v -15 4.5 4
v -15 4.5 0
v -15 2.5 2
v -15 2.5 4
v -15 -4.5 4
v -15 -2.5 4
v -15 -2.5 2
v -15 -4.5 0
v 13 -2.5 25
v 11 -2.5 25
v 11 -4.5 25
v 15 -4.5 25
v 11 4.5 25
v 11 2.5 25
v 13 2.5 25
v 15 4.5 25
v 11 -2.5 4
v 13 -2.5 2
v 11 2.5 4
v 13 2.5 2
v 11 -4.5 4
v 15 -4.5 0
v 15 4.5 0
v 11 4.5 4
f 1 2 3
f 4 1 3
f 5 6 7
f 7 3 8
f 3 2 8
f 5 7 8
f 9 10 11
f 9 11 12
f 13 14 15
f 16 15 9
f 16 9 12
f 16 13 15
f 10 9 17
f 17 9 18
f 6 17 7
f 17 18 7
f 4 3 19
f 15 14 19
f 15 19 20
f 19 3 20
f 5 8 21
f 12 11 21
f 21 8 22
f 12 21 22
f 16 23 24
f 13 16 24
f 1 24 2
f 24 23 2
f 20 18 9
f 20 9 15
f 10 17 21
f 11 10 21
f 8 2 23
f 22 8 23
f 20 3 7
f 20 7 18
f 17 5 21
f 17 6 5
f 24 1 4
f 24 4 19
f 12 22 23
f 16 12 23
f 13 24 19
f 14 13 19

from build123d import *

# Parameters (mm, degrees)
F0_W     = 2
F0_H     = 5
F0_W_2   = 26
F0_H_2   = 2
F1_DEPTH = 2
F2_DEPTH = 4
F3_DEPTH = 25


with BuildPart() as f1:
    # F0 (on Top) → F1 (new body)
    with BuildSketch(Plane.XY):
        Polygon((11, -4.5), (15, -4.5), (15, -2.5), (13, -2.5), (11, -2.5), align=None)
        Polygon((-15, -4.5), (11, -4.5), (11, -2.5), (-13.6096680164, -2.5), (-15, -2.5), align=None)
        with Locations((14, 0)):
            Rectangle(F0_W, F0_H)
        with Locations((12, 0)):
            Rectangle(F0_W, F0_H)
        Polygon((-13.6096680164, -2.5), (11, -2.5), (11, 2.5), (-15, 2.5), (-15, -2.5), align=None)
        Polygon((13, 2.5), (15, 2.5), (15, 4.5), (11, 4.5), (11, 2.5), align=None)
        with Locations((-2, 3.5)):
            Rectangle(F0_W_2, F0_H_2)
    extrude(amount=F1_DEPTH)

    # F0 (on Top) → F2 (join)
    with BuildSketch(Plane.XY):
        Polygon((11, -4.5), (15, -4.5), (15, -2.5), (13, -2.5), (11, -2.5), align=None)
        Polygon((-15, -4.5), (11, -4.5), (11, -2.5), (-13.6096680164, -2.5), (-15, -2.5), align=None)
        with Locations((14, 0)):
            Rectangle(F0_W, F0_H)
        Polygon((13, 2.5), (15, 2.5), (15, 4.5), (11, 4.5), (11, 2.5), align=None)
        with Locations((-2, 3.5)):
            Rectangle(F0_W_2, F0_H_2)
    extrude(amount=F2_DEPTH)

    # F0 (on Top) → F3 (join)
    with BuildSketch(Plane.XY):
        with Locations((14, 0)):
            Rectangle(F0_W, F0_H)
        Polygon((11, -4.5), (15, -4.5), (15, -2.5), (13, -2.5), (11, -2.5), align=None)
        Polygon((13, 2.5), (15, 2.5), (15, 4.5), (11, 4.5), (11, 2.5), align=None)
    extrude(amount=F3_DEPTH)


solid = f1.part
